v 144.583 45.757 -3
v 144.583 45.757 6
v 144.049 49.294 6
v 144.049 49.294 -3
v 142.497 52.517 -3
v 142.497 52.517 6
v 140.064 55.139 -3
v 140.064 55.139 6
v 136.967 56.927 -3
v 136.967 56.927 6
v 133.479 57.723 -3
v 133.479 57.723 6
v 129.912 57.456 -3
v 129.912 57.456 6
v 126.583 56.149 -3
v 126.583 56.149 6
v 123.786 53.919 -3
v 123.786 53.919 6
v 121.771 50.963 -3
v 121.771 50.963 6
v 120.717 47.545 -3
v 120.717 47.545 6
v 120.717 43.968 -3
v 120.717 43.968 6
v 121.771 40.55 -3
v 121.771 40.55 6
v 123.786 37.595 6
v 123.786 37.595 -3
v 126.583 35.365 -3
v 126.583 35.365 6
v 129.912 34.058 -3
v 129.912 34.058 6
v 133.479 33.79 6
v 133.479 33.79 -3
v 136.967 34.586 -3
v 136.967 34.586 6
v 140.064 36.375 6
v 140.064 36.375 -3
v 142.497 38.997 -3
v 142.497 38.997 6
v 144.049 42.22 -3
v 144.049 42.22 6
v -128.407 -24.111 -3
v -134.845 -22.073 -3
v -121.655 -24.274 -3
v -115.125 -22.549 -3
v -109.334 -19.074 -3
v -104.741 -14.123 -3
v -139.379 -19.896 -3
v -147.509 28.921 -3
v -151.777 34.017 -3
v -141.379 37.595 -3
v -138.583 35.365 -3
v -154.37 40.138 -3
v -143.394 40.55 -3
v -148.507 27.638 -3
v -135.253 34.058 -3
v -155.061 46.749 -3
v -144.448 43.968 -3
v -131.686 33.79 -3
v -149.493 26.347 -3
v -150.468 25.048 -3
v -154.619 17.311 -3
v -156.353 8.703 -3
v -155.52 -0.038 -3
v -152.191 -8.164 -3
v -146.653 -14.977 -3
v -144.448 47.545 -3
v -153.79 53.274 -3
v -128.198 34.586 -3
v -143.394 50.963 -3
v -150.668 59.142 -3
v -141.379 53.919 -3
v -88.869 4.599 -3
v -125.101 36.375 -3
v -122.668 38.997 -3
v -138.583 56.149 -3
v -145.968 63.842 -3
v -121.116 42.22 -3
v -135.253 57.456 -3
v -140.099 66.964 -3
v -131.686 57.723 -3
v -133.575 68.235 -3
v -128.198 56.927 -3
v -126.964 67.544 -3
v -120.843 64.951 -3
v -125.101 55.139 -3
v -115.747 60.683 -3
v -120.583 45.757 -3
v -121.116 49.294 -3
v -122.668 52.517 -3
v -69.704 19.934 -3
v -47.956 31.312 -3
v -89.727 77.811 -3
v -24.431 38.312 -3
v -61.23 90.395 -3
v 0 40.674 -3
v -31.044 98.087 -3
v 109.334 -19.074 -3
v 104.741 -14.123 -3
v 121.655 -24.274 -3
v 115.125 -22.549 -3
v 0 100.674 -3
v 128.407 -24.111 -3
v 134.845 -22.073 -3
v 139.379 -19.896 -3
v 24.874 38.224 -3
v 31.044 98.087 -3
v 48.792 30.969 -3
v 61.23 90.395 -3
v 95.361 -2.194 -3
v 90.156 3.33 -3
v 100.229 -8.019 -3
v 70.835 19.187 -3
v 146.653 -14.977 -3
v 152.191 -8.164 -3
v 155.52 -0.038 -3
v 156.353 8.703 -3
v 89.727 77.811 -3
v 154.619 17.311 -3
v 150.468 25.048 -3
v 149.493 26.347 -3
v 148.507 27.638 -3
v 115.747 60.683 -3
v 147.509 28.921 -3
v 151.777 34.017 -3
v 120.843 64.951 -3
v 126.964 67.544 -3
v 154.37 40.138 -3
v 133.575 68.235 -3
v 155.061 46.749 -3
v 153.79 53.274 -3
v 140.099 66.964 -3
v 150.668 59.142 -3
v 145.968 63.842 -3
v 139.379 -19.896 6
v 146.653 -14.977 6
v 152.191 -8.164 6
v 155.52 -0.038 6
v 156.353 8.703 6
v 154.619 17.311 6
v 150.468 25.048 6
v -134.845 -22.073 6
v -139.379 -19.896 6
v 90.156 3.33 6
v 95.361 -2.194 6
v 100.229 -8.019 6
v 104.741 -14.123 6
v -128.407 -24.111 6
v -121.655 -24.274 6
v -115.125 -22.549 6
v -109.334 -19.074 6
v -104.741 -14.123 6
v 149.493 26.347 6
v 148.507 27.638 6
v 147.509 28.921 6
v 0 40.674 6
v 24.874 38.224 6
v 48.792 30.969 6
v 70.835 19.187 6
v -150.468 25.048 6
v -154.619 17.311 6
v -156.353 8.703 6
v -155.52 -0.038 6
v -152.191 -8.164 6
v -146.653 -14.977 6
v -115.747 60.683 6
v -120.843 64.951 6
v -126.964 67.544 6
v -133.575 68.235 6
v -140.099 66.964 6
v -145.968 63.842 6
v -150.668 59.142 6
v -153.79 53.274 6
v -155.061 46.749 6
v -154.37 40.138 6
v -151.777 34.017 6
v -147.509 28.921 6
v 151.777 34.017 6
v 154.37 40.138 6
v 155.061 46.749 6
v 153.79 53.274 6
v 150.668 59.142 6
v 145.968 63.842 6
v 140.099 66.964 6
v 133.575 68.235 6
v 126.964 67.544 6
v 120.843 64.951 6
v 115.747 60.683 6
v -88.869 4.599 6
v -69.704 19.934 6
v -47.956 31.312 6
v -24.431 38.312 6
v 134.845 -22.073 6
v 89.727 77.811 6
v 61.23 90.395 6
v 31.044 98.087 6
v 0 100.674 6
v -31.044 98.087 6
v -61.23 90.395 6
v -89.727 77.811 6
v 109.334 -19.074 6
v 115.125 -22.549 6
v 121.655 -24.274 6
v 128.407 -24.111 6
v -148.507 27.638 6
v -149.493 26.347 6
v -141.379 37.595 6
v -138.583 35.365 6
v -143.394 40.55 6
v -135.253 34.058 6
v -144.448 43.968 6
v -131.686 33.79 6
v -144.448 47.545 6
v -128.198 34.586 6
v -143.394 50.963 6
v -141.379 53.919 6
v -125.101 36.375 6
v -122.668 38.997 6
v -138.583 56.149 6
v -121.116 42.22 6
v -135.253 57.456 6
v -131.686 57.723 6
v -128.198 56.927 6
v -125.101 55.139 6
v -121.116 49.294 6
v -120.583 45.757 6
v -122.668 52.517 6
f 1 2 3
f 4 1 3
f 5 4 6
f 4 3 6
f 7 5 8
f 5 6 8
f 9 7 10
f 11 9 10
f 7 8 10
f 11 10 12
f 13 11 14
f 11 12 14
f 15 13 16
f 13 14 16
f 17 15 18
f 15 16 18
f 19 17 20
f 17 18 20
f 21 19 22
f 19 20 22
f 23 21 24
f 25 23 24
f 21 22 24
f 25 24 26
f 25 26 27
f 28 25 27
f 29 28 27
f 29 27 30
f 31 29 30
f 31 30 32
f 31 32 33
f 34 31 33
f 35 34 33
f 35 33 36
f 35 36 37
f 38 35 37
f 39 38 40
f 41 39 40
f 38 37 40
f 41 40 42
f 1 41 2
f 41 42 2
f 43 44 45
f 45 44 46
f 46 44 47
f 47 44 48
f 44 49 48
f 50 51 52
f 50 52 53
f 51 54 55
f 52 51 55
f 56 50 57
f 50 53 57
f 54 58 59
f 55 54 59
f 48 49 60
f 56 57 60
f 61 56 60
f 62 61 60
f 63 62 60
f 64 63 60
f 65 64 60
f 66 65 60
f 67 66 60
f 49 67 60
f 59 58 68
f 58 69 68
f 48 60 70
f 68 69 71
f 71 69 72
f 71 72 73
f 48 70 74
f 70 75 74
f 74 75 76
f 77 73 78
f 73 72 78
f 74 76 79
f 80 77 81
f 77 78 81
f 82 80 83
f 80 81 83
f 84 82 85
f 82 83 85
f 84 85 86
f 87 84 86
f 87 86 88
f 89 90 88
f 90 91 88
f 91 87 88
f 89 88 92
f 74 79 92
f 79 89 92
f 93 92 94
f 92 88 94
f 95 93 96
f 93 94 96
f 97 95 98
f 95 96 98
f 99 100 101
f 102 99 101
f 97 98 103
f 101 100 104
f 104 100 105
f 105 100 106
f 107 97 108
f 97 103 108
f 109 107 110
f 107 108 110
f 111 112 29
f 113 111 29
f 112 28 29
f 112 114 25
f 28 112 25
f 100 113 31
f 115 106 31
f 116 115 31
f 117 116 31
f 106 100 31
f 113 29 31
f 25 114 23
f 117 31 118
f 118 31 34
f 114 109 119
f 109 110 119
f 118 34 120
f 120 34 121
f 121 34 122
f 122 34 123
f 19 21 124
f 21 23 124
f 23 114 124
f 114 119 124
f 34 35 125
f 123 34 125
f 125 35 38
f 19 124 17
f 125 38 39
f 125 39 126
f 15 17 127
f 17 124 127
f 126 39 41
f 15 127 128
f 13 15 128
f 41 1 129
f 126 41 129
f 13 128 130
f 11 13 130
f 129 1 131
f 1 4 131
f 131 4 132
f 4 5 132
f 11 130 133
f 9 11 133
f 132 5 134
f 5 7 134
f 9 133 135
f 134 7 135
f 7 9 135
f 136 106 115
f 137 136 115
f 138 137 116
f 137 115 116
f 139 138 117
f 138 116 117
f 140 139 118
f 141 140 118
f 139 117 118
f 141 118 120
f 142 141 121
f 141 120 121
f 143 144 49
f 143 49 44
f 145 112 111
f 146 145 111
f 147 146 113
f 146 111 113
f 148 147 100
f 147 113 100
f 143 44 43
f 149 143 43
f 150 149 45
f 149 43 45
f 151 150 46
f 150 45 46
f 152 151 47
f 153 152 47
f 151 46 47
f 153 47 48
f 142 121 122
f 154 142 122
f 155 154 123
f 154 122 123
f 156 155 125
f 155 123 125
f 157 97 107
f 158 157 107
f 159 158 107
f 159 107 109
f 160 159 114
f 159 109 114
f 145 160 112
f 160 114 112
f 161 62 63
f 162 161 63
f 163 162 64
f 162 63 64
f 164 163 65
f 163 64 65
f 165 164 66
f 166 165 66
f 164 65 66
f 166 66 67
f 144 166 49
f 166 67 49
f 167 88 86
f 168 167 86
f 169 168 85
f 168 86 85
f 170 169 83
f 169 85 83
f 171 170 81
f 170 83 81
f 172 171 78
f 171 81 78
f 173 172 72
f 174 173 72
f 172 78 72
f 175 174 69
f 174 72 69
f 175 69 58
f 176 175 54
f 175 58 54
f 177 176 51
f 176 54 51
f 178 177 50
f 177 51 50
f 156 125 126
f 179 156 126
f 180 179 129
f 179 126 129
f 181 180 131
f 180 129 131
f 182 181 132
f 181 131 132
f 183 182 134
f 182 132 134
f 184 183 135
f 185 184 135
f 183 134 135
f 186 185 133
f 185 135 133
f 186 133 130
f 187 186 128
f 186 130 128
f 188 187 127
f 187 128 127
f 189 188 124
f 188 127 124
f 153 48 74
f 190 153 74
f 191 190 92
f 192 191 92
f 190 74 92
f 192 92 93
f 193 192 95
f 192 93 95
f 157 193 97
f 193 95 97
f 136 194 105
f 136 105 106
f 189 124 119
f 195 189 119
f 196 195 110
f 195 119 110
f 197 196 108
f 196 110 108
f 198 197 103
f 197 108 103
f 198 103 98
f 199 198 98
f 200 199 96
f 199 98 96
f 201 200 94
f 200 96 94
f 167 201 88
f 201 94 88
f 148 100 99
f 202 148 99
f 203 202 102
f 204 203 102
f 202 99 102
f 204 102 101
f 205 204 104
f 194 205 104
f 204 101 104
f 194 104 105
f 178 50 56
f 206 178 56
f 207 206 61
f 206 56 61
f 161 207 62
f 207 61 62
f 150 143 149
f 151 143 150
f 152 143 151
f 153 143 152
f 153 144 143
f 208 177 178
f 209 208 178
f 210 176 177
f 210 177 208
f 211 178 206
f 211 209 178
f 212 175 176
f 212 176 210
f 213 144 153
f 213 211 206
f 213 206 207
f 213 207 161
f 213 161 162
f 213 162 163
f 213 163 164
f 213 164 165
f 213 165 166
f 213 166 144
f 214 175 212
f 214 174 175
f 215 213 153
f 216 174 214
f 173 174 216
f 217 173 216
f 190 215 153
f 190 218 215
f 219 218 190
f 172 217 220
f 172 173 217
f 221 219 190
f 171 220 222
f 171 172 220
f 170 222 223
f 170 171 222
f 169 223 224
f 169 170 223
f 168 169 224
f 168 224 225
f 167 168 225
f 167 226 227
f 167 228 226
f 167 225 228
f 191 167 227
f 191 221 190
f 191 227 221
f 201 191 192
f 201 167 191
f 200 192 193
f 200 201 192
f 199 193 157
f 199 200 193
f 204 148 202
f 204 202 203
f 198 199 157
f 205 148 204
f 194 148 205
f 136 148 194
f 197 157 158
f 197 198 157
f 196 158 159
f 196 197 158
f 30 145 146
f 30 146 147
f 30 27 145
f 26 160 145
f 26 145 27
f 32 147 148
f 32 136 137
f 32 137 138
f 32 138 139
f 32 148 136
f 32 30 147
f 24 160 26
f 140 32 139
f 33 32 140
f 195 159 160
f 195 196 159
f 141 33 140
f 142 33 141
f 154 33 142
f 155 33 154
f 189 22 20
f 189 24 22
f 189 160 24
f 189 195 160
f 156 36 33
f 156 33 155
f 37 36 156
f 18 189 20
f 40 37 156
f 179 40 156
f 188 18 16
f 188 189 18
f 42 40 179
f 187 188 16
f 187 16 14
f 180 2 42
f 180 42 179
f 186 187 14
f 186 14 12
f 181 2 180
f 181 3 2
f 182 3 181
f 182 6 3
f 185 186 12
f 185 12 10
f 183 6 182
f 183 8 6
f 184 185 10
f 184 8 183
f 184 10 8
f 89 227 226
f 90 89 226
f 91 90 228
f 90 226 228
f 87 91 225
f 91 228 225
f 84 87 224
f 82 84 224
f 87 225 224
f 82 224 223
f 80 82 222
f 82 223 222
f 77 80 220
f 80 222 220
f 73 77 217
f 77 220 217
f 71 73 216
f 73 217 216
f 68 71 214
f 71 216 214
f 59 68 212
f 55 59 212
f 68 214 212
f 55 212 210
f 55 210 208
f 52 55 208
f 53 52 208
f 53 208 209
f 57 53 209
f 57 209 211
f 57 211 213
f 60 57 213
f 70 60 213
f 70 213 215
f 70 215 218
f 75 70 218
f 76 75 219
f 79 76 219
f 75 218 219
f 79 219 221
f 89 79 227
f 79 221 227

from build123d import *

# Parameters (mm, degrees)
BOSS_EXTRUDE1_DEPTH = 3
SKETCH2_R           = 4
CUT_EXTRUDE1_DEPTH  = 3
SCALE1_SCALE        = 3


with BuildPart() as part:
    # Sketch1 → Boss-Extrude1 (new body)
    with BuildSketch(Plane.XY):
        with BuildLine():
            ThreePointArc((-34.913508692, 24.234209515), (-19.70147324, 37.657694462), (0, 42.5))
            Line((0, 42.5), (0, 62.5))
            ThreePointArc((0, 62.5), (-20.410075573, 59.073503494), (-38.582229462, 49.169722083))
            ThreePointArc((-38.582229462, 49.169722083), (-44.194173824, 44.194173824), (-49.169722083, 38.582229462))
            ThreePointArc((-49.169722083, 38.582229462), (-49.667032373, 37.939898462), (-50.155952108, 37.291158043))
            ThreePointArc((-50.155952108, 37.291158043), (-51.839867242, 28.929182932), (-46.459785364, 22.31005029))
            Line((-46.459785364, 22.31005029), (-44.948491744, 21.584325098))
            ThreePointArc((-44.948491744, 21.584325098), (-39.442958133, 21.061075731), (-34.913508692, 24.234209515))
        make_face()
        with BuildLine():
            ThreePointArc((0, 42.5), (16.264045876, 39.264880132), (30.0520382, 30.0520382))
            Line((30.0520382, 30.0520382), (44.194173824, 44.194173824))
            ThreePointArc((44.194173824, 44.194173824), (41.462902158, 46.766203017), (38.582229462, 49.169722083))
            ThreePointArc((38.582229462, 49.169722083), (20.410075573, 59.073503494), (0, 62.5))
            Line((0, 62.5), (0, 42.5))
        make_face()
        with BuildLine():
            Line((44.194173824, 44.194173824), (30.0520382, 30.0520382))
            ThreePointArc((30.0520382, 30.0520382), (32.612763658, 27.251745753), (34.913508692, 24.234209515))
            ThreePointArc((34.913508692, 24.234209515), (39.442958133, 21.061075731), (44.948491744, 21.584325098))
            Line((44.948491744, 21.584325098), (46.459785364, 22.31005029))
            ThreePointArc((46.459785364, 22.31005029), (51.839867242, 28.929182932), (50.155952108, 37.291158043))
            ThreePointArc((50.155952108, 37.291158043), (49.667032373, 37.939898462), (49.169722083, 38.582229462))
            ThreePointArc((49.169722083, 38.582229462), (46.766203017, 41.462902158), (44.194173824, 44.194173824))
        make_face()
        with BuildLine():
            ThreePointArc((38.582229462, 49.169722083), (41.462902158, 46.766203017), (44.194173824, 44.194173824))
            ThreePointArc((44.194173824, 44.194173824), (46.766203017, 41.462902158), (49.169722083, 38.582229462))
            ThreePointArc((49.169722083, 38.582229462), (49.497474683, 49.497474683), (38.582229462, 49.169722083))
        make_face()
        with BuildLine():
            ThreePointArc((-49.169722083, 38.582229462), (-44.194173824, 44.194173824), (-38.582229462, 49.169722083))
            ThreePointArc((-38.582229462, 49.169722083), (-49.497474683, 49.497474683), (-49.169722083, 38.582229462))
        make_face()
    extrude(amount=BOSS_EXTRUDE1_DEPTH)

    # Sketch2 → Cut-Extrude1 (cut)
    with BuildSketch(Plane.XY.offset(3)):
        with Locations((-44.194173824, 44.194173824)):
            Circle(SKETCH2_R)
        with Locations((44.194173824, 44.194173824)):
            Circle(SKETCH2_R)
    extrude(amount=-CUT_EXTRUDE1_DEPTH, mode=Mode.SUBTRACT)


with BuildPart() as part_1:
    # Scale1: scaled about (0, 43.412850072, 1.5)
    add(part.part.scale(SCALE1_SCALE).moved(Location((0, -86.825700144, -3))))


solid = part_1.part
